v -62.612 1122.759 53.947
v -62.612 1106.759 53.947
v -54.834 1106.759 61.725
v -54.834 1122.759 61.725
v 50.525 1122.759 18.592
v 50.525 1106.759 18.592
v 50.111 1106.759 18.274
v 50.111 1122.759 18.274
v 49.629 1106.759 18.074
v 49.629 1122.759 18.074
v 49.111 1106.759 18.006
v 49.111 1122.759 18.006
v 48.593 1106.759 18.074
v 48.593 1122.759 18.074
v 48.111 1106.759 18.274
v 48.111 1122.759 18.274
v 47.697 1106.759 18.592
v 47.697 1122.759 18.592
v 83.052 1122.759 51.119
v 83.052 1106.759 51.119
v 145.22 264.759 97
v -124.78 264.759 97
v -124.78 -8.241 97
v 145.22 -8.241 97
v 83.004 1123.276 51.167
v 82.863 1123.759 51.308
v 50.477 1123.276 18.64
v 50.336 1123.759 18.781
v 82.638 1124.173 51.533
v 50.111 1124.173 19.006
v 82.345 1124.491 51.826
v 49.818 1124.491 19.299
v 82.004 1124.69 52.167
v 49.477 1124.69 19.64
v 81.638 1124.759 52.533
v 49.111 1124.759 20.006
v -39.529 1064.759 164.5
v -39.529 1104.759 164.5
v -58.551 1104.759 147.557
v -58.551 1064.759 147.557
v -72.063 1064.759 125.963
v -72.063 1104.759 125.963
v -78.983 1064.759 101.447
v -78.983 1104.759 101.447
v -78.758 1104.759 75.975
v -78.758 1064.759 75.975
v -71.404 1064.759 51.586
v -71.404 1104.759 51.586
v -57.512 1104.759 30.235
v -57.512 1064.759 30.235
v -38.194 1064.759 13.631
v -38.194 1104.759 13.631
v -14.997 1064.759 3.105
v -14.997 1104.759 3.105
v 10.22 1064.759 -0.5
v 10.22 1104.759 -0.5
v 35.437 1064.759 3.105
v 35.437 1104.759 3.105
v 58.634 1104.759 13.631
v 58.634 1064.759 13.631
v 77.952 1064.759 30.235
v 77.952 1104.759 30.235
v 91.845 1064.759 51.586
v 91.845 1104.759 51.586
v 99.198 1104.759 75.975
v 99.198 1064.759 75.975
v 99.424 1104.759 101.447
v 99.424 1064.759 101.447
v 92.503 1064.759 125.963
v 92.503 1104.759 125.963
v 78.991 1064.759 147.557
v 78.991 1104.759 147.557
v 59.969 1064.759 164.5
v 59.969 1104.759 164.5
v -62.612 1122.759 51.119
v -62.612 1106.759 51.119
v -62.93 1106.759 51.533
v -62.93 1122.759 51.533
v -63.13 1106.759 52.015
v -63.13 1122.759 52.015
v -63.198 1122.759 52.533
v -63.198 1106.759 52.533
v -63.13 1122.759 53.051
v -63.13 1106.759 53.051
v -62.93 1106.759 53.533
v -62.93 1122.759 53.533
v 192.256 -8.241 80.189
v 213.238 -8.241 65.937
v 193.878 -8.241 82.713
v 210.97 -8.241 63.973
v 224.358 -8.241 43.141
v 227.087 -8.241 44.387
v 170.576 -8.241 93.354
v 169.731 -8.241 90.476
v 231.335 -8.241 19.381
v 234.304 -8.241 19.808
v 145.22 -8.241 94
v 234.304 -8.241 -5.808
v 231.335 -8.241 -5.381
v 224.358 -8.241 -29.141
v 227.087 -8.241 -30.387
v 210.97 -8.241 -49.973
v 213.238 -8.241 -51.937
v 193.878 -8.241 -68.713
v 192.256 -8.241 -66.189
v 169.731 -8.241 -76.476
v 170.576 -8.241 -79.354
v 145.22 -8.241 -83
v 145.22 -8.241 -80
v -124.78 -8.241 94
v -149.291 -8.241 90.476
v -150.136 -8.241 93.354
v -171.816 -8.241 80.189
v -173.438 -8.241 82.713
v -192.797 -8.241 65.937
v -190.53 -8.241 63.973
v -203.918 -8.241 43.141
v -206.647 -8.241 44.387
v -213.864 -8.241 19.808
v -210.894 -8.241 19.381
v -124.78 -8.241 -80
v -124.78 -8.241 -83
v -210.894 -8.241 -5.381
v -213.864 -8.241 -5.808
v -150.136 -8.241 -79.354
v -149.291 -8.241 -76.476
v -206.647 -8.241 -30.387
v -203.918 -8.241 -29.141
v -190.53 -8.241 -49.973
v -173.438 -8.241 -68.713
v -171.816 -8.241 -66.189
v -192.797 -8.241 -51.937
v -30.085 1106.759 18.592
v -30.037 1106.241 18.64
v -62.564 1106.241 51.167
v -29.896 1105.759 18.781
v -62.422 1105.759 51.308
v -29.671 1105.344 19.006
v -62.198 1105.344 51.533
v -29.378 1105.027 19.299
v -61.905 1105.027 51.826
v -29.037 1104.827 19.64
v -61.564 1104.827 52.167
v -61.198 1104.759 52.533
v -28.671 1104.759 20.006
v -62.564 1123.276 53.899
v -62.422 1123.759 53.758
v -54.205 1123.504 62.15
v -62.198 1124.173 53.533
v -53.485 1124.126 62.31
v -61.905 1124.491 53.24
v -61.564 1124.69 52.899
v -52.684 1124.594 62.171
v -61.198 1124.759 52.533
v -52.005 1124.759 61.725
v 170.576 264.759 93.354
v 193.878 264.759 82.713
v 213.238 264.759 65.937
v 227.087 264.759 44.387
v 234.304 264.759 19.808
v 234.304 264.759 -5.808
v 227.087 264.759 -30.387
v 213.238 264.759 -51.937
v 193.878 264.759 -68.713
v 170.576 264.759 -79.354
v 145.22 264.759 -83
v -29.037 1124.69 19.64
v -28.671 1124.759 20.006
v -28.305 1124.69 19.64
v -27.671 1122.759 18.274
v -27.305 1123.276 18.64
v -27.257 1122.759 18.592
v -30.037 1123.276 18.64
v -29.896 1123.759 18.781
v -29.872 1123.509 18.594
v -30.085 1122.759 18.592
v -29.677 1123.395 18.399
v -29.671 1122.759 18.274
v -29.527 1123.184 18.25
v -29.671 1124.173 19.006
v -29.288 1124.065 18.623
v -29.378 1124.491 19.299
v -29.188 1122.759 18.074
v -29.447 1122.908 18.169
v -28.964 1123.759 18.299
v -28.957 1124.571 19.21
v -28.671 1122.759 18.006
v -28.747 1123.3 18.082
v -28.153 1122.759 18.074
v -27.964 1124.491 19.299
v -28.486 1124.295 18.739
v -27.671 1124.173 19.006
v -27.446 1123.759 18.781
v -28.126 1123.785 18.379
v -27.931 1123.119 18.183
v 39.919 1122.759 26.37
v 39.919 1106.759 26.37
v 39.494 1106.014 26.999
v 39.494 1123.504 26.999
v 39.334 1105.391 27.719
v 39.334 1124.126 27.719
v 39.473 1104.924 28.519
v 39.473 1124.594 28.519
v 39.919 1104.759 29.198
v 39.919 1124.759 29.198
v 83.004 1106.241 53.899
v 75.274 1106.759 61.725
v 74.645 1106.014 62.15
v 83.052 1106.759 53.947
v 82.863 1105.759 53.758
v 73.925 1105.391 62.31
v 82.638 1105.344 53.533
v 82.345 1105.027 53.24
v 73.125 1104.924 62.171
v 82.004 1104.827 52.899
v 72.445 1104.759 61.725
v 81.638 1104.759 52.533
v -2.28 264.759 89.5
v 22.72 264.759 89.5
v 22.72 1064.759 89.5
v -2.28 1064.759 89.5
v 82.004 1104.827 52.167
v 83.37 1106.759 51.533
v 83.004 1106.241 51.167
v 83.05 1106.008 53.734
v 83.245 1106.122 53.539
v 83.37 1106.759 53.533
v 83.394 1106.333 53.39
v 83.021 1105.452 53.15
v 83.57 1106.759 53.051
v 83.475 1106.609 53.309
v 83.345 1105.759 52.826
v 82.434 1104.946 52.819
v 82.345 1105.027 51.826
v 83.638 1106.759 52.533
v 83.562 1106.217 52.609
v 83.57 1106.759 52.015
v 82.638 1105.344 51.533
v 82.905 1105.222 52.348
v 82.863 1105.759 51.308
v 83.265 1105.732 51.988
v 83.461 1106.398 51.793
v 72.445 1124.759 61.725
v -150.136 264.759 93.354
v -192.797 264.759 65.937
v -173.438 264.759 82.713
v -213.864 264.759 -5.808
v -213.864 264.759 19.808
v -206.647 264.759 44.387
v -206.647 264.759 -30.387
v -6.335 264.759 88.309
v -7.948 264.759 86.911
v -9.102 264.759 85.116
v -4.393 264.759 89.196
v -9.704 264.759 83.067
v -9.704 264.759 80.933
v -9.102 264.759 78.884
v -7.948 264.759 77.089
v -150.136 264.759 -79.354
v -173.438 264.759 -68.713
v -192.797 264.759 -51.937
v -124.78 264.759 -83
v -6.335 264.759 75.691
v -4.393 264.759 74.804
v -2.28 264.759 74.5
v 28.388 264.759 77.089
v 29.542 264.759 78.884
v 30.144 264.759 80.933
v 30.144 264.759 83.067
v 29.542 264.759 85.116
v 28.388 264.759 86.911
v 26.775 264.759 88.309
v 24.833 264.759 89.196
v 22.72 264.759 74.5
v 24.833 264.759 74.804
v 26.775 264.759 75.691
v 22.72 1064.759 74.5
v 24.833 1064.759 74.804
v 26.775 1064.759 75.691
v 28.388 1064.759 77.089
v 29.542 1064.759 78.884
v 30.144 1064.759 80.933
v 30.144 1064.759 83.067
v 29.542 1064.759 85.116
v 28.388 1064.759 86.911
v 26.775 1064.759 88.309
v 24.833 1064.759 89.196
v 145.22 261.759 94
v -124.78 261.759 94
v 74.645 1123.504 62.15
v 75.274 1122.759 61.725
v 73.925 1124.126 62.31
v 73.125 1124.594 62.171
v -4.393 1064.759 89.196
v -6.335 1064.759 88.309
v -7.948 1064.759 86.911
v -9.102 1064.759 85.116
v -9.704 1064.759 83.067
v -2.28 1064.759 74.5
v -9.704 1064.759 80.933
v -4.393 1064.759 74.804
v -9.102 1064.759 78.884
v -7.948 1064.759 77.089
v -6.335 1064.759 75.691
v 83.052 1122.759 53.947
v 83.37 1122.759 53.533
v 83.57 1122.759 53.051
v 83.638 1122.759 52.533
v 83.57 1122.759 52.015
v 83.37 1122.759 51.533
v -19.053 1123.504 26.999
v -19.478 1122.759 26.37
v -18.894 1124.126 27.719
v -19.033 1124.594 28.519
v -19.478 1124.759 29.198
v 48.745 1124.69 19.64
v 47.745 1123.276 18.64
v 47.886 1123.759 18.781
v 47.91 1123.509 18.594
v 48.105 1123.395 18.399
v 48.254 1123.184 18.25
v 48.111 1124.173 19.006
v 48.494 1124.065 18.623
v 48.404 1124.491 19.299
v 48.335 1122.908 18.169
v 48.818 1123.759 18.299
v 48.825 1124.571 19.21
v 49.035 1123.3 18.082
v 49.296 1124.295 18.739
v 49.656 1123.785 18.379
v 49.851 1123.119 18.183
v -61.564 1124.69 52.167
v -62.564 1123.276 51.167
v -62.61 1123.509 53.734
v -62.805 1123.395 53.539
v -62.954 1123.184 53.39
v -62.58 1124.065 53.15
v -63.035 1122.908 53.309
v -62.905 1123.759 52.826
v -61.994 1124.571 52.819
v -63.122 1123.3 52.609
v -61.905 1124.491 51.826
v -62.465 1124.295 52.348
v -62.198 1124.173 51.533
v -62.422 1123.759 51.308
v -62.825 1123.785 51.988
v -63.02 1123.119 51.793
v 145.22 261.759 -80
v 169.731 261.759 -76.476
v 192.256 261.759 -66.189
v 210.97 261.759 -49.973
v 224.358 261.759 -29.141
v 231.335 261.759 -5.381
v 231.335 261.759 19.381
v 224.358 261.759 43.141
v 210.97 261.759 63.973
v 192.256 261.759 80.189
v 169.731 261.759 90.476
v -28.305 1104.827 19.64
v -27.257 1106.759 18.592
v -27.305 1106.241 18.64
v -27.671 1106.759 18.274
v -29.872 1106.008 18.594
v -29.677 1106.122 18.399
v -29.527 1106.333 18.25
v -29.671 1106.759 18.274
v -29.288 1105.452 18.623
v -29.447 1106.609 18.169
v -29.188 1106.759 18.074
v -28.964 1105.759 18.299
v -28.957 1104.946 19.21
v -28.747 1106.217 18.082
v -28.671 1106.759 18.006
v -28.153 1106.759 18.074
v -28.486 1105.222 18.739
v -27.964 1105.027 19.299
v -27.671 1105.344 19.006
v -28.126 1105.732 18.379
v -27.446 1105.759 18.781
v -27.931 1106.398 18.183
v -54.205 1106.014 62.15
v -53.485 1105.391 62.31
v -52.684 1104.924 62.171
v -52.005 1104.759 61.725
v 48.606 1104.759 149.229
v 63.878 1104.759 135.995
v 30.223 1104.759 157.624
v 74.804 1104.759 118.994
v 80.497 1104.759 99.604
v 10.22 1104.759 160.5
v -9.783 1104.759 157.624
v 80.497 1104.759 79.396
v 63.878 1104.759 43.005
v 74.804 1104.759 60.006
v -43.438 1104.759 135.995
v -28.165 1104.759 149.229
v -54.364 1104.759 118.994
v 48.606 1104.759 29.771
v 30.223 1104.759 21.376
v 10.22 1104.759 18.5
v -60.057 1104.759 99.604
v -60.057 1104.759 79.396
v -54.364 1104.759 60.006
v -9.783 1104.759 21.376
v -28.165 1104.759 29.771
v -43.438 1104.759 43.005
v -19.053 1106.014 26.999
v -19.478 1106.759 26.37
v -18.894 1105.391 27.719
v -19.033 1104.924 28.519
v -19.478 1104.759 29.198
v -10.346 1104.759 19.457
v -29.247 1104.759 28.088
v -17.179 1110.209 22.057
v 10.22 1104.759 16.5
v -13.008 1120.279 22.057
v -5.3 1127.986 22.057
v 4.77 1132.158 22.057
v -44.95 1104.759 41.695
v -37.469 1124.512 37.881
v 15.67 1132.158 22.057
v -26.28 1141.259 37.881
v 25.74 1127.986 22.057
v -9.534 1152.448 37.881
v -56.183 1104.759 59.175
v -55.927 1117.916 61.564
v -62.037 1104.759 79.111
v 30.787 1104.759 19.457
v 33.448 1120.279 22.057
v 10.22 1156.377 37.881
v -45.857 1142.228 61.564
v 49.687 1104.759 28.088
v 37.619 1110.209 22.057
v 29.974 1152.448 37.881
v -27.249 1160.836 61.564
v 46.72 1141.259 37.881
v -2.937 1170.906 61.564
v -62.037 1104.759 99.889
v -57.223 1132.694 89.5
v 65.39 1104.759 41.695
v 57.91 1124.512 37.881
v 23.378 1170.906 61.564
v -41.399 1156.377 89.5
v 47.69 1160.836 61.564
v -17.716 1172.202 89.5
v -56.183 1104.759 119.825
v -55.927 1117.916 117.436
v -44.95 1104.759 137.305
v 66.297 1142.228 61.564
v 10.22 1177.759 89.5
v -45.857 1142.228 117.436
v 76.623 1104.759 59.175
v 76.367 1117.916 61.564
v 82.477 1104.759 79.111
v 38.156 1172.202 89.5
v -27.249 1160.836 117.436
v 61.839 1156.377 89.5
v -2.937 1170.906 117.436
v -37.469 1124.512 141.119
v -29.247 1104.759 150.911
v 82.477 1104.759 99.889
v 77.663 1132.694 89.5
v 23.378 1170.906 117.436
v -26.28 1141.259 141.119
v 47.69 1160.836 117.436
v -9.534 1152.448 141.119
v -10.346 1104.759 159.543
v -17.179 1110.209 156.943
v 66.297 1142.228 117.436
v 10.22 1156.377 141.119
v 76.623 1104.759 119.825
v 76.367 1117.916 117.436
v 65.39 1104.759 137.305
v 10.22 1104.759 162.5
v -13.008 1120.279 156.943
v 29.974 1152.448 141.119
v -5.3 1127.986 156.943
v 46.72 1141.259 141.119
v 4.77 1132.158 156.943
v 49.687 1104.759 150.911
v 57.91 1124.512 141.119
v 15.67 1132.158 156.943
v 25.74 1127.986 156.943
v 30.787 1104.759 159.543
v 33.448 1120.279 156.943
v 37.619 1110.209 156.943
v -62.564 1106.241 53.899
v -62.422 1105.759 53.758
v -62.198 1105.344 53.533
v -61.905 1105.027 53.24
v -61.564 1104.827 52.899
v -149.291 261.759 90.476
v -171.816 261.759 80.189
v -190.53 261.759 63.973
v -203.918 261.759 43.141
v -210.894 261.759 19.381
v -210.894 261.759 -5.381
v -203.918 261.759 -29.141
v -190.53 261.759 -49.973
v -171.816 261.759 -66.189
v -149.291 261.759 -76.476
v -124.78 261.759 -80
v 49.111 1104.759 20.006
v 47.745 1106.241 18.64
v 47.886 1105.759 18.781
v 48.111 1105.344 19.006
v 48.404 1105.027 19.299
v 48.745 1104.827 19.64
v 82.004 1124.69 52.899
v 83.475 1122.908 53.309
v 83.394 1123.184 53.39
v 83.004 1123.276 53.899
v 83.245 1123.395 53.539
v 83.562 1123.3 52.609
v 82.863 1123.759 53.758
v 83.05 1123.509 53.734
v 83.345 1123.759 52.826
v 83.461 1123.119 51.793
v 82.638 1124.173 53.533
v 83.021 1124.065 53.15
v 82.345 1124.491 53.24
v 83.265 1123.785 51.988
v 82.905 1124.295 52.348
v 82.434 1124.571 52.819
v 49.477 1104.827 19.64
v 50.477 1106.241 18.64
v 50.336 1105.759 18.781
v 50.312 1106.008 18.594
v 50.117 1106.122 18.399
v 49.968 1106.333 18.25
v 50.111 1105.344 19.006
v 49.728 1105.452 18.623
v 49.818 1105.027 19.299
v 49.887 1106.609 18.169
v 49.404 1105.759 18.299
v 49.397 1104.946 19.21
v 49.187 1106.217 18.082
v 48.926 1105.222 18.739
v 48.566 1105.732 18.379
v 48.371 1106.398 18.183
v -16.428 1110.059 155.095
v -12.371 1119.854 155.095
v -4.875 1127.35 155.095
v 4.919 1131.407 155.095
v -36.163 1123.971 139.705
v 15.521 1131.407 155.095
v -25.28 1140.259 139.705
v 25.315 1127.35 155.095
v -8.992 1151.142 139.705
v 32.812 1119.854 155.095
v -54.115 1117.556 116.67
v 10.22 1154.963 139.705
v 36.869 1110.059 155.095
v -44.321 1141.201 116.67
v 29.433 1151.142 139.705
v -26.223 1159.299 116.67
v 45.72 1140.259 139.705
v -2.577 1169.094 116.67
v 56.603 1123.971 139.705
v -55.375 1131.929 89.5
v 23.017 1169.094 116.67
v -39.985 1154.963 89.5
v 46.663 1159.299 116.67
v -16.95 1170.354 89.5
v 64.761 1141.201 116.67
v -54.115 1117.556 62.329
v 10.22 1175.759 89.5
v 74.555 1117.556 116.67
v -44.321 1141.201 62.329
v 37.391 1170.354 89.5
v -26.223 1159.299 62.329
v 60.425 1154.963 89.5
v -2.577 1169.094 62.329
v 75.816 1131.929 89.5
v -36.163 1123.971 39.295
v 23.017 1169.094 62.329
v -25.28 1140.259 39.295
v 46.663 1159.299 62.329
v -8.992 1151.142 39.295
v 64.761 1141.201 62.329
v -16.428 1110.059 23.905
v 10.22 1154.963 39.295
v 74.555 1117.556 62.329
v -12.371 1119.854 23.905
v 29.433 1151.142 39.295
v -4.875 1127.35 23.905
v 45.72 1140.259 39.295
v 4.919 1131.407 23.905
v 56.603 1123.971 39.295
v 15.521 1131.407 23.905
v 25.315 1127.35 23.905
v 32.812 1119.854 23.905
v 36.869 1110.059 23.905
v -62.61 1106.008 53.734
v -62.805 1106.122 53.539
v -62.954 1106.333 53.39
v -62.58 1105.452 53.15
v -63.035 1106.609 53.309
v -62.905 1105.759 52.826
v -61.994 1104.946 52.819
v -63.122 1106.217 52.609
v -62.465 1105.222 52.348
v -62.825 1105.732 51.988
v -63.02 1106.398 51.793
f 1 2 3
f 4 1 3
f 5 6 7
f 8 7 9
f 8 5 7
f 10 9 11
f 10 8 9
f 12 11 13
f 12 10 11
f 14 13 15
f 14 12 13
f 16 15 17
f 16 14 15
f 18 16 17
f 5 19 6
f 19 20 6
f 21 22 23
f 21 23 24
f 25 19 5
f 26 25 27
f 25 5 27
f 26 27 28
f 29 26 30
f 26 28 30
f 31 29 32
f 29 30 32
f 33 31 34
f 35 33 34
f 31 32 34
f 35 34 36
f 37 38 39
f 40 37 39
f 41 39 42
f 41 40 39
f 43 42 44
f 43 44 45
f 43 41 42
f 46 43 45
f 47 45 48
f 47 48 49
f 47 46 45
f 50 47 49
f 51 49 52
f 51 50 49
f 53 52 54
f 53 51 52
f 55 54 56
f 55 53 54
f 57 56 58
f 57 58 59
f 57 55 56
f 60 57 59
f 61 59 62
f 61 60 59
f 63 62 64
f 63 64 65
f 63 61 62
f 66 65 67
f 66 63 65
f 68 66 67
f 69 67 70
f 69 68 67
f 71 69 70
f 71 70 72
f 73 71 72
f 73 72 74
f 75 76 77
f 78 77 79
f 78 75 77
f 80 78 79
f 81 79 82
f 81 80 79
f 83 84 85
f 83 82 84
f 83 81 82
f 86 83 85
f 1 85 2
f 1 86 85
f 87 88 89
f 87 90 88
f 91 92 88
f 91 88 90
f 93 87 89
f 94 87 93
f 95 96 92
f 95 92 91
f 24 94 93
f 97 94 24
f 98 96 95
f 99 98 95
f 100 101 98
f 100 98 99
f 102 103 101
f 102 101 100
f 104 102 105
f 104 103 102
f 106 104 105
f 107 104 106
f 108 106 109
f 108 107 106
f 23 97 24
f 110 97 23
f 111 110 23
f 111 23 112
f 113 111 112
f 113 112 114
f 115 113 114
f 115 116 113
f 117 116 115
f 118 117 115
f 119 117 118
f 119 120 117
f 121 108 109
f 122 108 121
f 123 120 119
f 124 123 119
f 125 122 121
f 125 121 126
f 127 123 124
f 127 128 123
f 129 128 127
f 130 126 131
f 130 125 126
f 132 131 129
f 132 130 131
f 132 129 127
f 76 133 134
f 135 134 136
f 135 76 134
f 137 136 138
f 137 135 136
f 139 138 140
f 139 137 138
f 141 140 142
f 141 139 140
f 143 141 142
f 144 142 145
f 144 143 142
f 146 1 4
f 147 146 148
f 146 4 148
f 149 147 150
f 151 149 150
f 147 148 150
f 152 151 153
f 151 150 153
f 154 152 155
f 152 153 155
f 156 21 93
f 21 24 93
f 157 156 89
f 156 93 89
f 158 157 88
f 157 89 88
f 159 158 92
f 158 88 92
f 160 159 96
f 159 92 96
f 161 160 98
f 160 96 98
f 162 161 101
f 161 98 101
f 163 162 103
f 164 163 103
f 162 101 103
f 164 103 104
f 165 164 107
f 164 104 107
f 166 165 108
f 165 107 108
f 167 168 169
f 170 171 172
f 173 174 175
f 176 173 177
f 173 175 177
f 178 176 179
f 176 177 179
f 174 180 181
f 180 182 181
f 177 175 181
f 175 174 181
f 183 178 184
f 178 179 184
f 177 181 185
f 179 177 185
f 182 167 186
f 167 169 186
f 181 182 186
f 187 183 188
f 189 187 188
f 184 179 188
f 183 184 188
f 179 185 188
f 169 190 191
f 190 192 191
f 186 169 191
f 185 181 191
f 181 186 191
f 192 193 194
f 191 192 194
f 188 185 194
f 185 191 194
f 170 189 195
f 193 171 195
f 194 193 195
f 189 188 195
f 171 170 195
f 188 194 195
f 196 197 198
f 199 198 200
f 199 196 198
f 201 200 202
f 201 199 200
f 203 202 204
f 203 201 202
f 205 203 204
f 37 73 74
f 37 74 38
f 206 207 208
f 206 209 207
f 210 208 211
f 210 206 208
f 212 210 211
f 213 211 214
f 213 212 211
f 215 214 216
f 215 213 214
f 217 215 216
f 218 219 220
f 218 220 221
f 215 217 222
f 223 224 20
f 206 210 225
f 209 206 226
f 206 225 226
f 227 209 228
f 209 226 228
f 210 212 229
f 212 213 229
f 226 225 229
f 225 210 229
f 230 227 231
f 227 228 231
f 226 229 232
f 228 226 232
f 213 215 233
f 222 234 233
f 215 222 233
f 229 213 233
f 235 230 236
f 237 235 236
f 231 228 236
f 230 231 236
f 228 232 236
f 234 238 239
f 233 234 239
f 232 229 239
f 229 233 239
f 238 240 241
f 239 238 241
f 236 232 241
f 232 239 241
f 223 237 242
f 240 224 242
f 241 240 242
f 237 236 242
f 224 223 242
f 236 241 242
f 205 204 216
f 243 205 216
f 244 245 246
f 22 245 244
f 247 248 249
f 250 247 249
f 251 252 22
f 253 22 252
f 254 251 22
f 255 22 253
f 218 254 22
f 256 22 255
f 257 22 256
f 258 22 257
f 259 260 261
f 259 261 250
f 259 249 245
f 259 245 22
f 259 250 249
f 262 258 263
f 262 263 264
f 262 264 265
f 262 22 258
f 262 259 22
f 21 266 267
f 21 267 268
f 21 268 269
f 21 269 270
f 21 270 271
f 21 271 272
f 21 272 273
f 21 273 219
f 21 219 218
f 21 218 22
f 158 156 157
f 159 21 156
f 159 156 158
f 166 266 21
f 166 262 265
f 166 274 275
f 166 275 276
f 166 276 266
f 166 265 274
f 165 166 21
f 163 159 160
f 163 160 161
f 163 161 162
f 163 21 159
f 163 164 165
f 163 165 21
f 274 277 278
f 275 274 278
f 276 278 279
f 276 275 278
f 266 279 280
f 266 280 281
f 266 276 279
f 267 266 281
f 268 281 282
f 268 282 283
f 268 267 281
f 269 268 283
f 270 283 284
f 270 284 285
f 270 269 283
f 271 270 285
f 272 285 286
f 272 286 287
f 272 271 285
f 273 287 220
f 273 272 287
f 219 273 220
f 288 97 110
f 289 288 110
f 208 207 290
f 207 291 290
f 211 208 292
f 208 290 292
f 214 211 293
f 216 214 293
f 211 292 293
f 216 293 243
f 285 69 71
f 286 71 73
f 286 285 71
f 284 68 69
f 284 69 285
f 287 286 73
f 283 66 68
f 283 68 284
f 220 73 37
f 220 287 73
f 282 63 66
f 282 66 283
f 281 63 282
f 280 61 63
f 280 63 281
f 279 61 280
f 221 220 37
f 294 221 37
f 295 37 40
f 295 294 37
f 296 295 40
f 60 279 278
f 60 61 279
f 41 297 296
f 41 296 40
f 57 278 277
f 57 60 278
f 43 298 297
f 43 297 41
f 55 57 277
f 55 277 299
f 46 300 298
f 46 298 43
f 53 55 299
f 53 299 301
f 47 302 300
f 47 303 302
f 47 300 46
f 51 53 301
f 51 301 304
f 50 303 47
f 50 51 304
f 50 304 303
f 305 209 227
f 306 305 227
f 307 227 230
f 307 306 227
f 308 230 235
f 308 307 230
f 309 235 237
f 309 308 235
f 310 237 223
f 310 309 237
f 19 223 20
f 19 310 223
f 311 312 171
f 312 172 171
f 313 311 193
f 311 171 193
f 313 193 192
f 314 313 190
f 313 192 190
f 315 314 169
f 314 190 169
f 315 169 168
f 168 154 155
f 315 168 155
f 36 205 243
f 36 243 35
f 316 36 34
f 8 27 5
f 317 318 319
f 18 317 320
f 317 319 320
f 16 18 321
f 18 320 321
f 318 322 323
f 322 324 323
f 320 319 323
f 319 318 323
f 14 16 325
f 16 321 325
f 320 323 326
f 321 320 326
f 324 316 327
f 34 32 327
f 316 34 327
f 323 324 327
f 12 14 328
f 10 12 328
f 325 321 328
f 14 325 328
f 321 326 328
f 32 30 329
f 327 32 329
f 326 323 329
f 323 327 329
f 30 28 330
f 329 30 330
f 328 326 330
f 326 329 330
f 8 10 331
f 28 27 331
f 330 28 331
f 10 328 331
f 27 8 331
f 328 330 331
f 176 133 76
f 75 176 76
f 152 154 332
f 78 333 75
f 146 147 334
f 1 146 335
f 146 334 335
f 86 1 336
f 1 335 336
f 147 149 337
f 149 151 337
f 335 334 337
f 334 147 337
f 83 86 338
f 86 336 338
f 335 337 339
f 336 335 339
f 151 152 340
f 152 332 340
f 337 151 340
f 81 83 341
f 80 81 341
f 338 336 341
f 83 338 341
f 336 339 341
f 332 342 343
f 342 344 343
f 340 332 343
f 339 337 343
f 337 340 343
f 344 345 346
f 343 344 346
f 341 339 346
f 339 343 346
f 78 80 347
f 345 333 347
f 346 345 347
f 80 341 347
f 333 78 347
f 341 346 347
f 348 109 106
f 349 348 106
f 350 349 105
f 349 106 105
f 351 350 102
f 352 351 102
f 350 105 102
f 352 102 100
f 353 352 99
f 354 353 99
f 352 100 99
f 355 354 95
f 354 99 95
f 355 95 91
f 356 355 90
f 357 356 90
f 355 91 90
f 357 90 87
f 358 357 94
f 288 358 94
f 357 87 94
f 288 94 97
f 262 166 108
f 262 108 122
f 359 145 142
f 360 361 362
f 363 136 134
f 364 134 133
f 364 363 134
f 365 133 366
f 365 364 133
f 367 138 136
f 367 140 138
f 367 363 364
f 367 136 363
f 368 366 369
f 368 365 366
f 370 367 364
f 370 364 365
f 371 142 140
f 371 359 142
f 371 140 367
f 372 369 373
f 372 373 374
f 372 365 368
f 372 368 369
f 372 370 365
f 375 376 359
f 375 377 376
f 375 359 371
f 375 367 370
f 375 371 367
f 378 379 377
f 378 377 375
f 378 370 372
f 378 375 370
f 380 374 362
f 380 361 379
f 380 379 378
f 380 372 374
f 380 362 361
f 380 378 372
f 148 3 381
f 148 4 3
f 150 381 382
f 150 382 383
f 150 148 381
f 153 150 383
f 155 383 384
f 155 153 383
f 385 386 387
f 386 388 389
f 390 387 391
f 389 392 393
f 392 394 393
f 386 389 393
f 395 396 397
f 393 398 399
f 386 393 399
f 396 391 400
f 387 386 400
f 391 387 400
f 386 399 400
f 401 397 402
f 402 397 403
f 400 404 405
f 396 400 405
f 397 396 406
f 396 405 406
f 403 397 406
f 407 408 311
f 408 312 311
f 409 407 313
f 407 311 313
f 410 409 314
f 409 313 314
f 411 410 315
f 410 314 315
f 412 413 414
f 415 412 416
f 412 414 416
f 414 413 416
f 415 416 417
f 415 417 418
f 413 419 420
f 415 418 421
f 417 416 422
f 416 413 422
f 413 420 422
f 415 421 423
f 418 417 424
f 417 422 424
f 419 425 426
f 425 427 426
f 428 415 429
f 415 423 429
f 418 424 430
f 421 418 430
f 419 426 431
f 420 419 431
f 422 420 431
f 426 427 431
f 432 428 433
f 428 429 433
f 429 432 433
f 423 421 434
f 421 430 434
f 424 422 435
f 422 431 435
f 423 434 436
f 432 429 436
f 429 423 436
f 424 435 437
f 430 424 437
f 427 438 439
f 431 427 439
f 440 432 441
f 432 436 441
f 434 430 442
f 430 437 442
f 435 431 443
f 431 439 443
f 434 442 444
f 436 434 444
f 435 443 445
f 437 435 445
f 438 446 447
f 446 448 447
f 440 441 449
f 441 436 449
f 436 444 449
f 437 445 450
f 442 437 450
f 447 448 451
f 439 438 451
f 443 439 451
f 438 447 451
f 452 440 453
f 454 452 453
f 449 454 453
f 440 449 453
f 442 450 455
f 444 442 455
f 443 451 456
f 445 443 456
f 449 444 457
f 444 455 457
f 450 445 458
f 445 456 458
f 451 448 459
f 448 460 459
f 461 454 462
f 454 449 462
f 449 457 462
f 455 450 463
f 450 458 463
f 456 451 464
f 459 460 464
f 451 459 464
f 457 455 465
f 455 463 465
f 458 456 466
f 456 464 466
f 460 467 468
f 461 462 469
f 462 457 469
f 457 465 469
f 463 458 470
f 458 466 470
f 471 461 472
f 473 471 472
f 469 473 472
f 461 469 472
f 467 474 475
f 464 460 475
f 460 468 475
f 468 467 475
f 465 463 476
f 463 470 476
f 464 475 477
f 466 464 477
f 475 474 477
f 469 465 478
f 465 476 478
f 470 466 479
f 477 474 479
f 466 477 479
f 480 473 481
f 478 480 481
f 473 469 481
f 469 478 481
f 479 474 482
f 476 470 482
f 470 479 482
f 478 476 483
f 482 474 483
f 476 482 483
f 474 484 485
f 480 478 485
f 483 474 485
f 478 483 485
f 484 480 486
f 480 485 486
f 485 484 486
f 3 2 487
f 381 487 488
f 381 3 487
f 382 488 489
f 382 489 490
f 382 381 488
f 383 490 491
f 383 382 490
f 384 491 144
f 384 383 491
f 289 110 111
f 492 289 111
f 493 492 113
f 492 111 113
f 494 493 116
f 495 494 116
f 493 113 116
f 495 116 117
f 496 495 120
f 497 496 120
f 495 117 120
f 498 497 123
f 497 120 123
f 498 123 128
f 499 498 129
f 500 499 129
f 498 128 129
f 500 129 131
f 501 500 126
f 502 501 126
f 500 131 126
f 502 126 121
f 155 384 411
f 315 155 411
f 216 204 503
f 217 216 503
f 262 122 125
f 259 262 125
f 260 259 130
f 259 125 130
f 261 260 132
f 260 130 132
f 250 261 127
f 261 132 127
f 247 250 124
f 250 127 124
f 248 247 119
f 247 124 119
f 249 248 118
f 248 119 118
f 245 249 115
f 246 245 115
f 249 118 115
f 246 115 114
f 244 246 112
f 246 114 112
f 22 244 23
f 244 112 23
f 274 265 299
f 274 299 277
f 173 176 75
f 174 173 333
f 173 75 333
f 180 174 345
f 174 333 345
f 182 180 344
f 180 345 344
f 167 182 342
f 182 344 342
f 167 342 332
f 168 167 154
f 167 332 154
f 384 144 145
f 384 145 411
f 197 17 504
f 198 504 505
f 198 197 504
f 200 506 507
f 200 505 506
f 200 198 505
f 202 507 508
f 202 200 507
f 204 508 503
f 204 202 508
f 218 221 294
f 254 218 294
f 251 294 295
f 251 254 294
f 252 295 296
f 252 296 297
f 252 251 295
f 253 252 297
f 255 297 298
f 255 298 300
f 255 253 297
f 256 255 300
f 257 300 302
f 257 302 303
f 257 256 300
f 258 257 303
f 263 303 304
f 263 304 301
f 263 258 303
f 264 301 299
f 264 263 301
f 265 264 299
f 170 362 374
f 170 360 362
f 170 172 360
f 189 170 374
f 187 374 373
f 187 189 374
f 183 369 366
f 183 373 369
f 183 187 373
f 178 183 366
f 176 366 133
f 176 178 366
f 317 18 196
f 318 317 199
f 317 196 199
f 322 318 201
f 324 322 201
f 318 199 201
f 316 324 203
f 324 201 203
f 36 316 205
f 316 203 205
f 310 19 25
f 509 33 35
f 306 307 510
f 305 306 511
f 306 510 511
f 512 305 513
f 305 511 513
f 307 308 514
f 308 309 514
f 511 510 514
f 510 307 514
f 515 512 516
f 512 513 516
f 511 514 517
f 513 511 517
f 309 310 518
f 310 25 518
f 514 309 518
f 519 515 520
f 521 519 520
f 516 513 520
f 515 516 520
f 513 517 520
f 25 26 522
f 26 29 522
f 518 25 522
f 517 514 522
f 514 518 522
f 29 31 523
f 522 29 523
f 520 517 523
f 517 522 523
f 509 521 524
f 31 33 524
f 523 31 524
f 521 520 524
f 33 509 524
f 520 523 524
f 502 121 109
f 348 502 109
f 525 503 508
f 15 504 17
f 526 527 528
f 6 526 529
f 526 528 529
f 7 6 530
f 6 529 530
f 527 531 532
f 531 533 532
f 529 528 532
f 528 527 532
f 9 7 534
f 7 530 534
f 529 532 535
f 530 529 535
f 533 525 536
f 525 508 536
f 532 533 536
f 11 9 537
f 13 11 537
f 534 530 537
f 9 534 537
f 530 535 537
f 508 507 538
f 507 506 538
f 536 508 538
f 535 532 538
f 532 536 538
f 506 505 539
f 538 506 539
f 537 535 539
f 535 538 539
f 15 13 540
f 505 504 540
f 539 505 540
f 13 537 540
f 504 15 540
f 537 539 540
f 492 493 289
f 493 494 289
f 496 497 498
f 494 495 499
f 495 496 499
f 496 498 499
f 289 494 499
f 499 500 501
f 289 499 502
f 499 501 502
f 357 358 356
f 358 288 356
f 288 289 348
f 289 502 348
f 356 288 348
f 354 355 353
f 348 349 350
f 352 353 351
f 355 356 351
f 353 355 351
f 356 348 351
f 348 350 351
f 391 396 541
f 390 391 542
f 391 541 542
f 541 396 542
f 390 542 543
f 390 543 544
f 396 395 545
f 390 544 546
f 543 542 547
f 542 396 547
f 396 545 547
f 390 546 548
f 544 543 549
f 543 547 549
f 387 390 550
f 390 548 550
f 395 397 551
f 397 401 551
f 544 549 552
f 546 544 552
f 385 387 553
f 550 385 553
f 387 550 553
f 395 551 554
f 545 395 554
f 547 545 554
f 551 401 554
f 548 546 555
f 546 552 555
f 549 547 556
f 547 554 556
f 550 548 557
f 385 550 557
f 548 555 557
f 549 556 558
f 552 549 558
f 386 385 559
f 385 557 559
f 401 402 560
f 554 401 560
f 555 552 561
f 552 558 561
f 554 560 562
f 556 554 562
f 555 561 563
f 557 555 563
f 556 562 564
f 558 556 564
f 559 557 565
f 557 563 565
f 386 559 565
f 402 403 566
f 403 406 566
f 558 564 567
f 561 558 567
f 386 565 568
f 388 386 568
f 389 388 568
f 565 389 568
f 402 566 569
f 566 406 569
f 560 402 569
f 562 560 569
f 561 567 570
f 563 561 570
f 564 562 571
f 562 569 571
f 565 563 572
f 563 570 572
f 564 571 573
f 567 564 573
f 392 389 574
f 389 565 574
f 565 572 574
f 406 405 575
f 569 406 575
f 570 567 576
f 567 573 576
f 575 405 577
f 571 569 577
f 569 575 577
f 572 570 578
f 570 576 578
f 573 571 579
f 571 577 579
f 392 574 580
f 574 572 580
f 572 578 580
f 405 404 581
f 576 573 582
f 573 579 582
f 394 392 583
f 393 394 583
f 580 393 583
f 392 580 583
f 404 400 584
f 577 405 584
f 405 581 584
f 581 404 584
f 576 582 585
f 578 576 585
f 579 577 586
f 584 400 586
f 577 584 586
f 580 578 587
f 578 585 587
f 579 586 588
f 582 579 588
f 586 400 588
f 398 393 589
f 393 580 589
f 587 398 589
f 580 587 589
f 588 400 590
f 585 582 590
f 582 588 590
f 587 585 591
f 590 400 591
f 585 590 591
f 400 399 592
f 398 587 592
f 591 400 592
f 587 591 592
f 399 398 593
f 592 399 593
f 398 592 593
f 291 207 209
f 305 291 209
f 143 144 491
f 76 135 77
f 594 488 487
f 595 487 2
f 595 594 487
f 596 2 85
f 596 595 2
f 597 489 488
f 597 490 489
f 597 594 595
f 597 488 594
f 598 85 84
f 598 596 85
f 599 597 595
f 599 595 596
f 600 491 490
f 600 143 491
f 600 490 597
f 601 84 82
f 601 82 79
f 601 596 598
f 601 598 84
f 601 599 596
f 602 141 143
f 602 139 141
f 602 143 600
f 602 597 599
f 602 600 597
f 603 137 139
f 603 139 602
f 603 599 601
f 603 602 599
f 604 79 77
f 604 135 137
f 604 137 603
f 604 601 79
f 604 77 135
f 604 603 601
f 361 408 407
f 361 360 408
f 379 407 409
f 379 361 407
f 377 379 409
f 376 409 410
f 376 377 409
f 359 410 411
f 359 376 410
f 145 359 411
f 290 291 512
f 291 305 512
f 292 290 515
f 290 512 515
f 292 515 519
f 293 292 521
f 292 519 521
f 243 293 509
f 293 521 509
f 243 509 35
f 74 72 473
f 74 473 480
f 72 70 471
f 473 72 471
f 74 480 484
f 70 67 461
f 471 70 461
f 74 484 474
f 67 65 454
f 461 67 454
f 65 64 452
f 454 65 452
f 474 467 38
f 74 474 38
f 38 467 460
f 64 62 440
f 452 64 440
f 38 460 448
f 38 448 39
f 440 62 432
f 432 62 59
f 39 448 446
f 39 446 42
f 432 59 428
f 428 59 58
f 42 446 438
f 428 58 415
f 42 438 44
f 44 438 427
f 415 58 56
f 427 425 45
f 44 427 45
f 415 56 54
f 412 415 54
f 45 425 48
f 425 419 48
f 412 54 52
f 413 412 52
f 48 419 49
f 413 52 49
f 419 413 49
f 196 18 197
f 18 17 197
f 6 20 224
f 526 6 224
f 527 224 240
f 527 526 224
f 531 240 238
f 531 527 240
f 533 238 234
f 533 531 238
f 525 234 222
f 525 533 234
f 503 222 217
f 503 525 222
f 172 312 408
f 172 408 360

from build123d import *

# Parameters (mm, degrees)
BOSS_EXTRUDE1_DEPTH   = 270
BOSS_EXTRUDE2_DEPTH   = 3
BOSS_EXTRUDE3_DEPTH   = 800
BOSS_EXTRUDE4_DEPTH   = 40
REVOLVE1_ANGLE        = 180
BOSS_EXTRUDE5_DEPTH   = 20
BOSS_EXTRUDE5_2_DEPTH = 20
FILLET1_R             = 2
FILLET2_R             = 2


with BuildPart() as part:
    # Sketch1 → Boss-Extrude1 (new body)
    with BuildSketch(Plane(origin=(0, -8.241432606, 0), x_dir=(1, 0, 0), z_dir=(0, 1, 0))):
        with BuildLine():
            Line((-124.779928143, 83.000032543), (145.220071857, 83.000032543))
            ThreePointArc((145.220071857, 83.000032543), (235.220071857, -6.999967457), (145.220071857, -96.999967457))
            Line((145.220071857, -96.999967457), (-124.779928143, -96.999967457))
            ThreePointArc((-124.779928143, -96.999967457), (-214.779928143, -6.999967457), (-124.779928143, 83.000032543))
        make_face()
        with BuildLine():
            Line((-124.779928143, 80.000032543), (145.220071857, 80.000032543))
            ThreePointArc((145.220071857, 80.000032543), (232.220071857, -6.999967457), (145.220071857, -93.999967457))
            Line((145.220071857, -93.999967457), (-124.779928143, -93.999967457))
            ThreePointArc((-124.779928143, -93.999967457), (-211.779928143, -6.999967457), (-124.779928143, 80.000032543))
        make_face(mode=Mode.SUBTRACT)
    extrude(amount=BOSS_EXTRUDE1_DEPTH)

    # Sketch4 → Boss-Extrude2 (add)
    with BuildSketch(Plane(origin=(0, 261.758567394, 0), x_dir=(1, 0, 0), z_dir=(0, 1, 0))):
        with BuildLine():
            Line((-124.779928143, -96.999967457), (145.220071857, -96.999967457))
            ThreePointArc((145.220071857, -96.999967457), (235.220071857, -6.999967457), (145.220071857, 83.000032543))
            Line((145.220071857, 83.000032543), (-124.779928143, 83.000032543))
            ThreePointArc((-124.779928143, 83.000032543), (-214.779928143, -6.999967457), (-124.779928143, -96.999967457))
        make_face()
    extrude(amount=BOSS_EXTRUDE2_DEPTH)

    # Sketch5 → Boss-Extrude3 (add)
    with BuildSketch(Plane(origin=(0, 264.758567394, 0), x_dir=(1, 0, 0), z_dir=(0, 1, 0))):
        with BuildLine():
            Line((22.720071857, -89.499967457), (-2.279928143, -89.499967457))
            ThreePointArc((-2.279928143, -89.499967457), (-9.779928143, -81.999967457), (-2.279928143, -74.499967457))
            Line((-2.279928143, -74.499967457), (22.720071857, -74.499967457))
            ThreePointArc((22.720071857, -74.499967457), (30.220071857, -81.999967457), (22.720071857, -89.499967457))
        make_face()
    extrude(amount=BOSS_EXTRUDE3_DEPTH)

    # Sketch6 → Boss-Extrude4 (add)
    with BuildSketch(Plane(origin=(0, 1064.758567394, 0), x_dir=(1, 0, 0), z_dir=(0, 1, 0))):
        with BuildLine():
            Line((59.969443713, -164.499967457), (-39.529299998, -164.499967457))
            ThreePointArc((-39.529299998, -164.499967457), (10.220071857, 0.500032543), (59.969443713, -164.499967457))
        make_face()
    extrude(amount=BOSS_EXTRUDE4_DEPTH)

    # Sketch7 → Revolve1 (revolve)
    with BuildSketch(Plane(origin=(0, 1104.758567394, 0), x_dir=(1, 0, 0), z_dir=(0, 1, 0))):
        with BuildLine():
            Line((10.220071857, -18.499967457), (10.220071857, -16.499967457))
            ThreePointArc((10.220071857, -16.499967457), (-62.779928143, -89.499967457), (10.220071857, -162.499967457))
            Line((10.220071857, -162.499967457), (10.220071857, -160.499967457))
            ThreePointArc((10.220071857, -160.499967457), (-60.779928143, -89.499967457), (10.220071857, -18.499967457))
        make_face()
    revolve(axis=Axis((10.220071857, 1104.758567394, 89.499967457), (0, 0, -1)), revolution_arc=REVOLVE1_ANGLE)


with BuildPart() as body_2:
    # Sketch9 → Boss-Extrude5 (new body)
    with BuildSketch(Plane(origin=(0, 1104.758567394, 0), x_dir=(1, 0, 0), z_dir=(0, 1, 0))):
        Polygon((73.859682164, -63.139577763), (84.466283882, -52.532976046), (49.110944823, -17.177636986), (38.504343105, -27.784238704), align=None)
    extrude(amount=BOSS_EXTRUDE5_DEPTH)

    # Fillet1
    fillet1_edges = [body_2.edges().sort_by_distance(p)[0] for p in [
        (66.788614352, 1124.758567394, 34.855306516),
        (43.807643964, 1124.758567394, 22.480937845),
        (43.807643964, 1104.758567394, 22.480937845),
        (66.788614352, 1104.758567394, 34.855306516),
        (79.162983023, 1104.758567394, 57.836276905),
        (38.504343105, 1114.758567394, 27.784238704),
        (49.110944823, 1114.758567394, 17.177636986),
        (84.466283882, 1114.758567394, 52.532976046),
        (73.859682164, 1114.758567394, 63.139577763),
        (79.162983023, 1124.758567394, 57.836276905),
    ]]
    fillet(fillet1_edges, radius=FILLET1_R)


with BuildPart() as body_3:
    # Sketch9 → Boss-Extrude5 2 (new body)
    with BuildSketch(Plane(origin=(0, 1104.758567394, 0), x_dir=(1, 0, 0), z_dir=(0, 1, 0))):
        Polygon((-18.06419939, -27.784238704), (-28.670801108, -17.177636986), (-64.026140167, -52.532976046), (-53.419538449, -63.139577763), align=None)
    extrude(amount=BOSS_EXTRUDE5_2_DEPTH)

    # Fillet2
    fillet2_edges = [body_3.edges().sort_by_distance(p)[0] for p in [
        (-23.367500249, 1104.758567394, 22.480937845),
        (-46.348470637, 1104.758567394, 34.855306516),
        (-58.722839308, 1104.758567394, 57.836276905),
        (-23.367500249, 1124.758567394, 22.480937845),
        (-46.348470637, 1124.758567394, 34.855306516),
        (-58.722839308, 1124.758567394, 57.836276905),
        (-53.419538449, 1114.758567394, 63.139577763),
        (-64.026140167, 1114.758567394, 52.532976046),
        (-28.670801108, 1114.758567394, 17.177636986),
        (-18.06419939, 1114.758567394, 27.784238704),
    ]]
    fillet(fillet2_edges, radius=FILLET2_R)


solid = Compound([part.part, body_2.part, body_3.part])
